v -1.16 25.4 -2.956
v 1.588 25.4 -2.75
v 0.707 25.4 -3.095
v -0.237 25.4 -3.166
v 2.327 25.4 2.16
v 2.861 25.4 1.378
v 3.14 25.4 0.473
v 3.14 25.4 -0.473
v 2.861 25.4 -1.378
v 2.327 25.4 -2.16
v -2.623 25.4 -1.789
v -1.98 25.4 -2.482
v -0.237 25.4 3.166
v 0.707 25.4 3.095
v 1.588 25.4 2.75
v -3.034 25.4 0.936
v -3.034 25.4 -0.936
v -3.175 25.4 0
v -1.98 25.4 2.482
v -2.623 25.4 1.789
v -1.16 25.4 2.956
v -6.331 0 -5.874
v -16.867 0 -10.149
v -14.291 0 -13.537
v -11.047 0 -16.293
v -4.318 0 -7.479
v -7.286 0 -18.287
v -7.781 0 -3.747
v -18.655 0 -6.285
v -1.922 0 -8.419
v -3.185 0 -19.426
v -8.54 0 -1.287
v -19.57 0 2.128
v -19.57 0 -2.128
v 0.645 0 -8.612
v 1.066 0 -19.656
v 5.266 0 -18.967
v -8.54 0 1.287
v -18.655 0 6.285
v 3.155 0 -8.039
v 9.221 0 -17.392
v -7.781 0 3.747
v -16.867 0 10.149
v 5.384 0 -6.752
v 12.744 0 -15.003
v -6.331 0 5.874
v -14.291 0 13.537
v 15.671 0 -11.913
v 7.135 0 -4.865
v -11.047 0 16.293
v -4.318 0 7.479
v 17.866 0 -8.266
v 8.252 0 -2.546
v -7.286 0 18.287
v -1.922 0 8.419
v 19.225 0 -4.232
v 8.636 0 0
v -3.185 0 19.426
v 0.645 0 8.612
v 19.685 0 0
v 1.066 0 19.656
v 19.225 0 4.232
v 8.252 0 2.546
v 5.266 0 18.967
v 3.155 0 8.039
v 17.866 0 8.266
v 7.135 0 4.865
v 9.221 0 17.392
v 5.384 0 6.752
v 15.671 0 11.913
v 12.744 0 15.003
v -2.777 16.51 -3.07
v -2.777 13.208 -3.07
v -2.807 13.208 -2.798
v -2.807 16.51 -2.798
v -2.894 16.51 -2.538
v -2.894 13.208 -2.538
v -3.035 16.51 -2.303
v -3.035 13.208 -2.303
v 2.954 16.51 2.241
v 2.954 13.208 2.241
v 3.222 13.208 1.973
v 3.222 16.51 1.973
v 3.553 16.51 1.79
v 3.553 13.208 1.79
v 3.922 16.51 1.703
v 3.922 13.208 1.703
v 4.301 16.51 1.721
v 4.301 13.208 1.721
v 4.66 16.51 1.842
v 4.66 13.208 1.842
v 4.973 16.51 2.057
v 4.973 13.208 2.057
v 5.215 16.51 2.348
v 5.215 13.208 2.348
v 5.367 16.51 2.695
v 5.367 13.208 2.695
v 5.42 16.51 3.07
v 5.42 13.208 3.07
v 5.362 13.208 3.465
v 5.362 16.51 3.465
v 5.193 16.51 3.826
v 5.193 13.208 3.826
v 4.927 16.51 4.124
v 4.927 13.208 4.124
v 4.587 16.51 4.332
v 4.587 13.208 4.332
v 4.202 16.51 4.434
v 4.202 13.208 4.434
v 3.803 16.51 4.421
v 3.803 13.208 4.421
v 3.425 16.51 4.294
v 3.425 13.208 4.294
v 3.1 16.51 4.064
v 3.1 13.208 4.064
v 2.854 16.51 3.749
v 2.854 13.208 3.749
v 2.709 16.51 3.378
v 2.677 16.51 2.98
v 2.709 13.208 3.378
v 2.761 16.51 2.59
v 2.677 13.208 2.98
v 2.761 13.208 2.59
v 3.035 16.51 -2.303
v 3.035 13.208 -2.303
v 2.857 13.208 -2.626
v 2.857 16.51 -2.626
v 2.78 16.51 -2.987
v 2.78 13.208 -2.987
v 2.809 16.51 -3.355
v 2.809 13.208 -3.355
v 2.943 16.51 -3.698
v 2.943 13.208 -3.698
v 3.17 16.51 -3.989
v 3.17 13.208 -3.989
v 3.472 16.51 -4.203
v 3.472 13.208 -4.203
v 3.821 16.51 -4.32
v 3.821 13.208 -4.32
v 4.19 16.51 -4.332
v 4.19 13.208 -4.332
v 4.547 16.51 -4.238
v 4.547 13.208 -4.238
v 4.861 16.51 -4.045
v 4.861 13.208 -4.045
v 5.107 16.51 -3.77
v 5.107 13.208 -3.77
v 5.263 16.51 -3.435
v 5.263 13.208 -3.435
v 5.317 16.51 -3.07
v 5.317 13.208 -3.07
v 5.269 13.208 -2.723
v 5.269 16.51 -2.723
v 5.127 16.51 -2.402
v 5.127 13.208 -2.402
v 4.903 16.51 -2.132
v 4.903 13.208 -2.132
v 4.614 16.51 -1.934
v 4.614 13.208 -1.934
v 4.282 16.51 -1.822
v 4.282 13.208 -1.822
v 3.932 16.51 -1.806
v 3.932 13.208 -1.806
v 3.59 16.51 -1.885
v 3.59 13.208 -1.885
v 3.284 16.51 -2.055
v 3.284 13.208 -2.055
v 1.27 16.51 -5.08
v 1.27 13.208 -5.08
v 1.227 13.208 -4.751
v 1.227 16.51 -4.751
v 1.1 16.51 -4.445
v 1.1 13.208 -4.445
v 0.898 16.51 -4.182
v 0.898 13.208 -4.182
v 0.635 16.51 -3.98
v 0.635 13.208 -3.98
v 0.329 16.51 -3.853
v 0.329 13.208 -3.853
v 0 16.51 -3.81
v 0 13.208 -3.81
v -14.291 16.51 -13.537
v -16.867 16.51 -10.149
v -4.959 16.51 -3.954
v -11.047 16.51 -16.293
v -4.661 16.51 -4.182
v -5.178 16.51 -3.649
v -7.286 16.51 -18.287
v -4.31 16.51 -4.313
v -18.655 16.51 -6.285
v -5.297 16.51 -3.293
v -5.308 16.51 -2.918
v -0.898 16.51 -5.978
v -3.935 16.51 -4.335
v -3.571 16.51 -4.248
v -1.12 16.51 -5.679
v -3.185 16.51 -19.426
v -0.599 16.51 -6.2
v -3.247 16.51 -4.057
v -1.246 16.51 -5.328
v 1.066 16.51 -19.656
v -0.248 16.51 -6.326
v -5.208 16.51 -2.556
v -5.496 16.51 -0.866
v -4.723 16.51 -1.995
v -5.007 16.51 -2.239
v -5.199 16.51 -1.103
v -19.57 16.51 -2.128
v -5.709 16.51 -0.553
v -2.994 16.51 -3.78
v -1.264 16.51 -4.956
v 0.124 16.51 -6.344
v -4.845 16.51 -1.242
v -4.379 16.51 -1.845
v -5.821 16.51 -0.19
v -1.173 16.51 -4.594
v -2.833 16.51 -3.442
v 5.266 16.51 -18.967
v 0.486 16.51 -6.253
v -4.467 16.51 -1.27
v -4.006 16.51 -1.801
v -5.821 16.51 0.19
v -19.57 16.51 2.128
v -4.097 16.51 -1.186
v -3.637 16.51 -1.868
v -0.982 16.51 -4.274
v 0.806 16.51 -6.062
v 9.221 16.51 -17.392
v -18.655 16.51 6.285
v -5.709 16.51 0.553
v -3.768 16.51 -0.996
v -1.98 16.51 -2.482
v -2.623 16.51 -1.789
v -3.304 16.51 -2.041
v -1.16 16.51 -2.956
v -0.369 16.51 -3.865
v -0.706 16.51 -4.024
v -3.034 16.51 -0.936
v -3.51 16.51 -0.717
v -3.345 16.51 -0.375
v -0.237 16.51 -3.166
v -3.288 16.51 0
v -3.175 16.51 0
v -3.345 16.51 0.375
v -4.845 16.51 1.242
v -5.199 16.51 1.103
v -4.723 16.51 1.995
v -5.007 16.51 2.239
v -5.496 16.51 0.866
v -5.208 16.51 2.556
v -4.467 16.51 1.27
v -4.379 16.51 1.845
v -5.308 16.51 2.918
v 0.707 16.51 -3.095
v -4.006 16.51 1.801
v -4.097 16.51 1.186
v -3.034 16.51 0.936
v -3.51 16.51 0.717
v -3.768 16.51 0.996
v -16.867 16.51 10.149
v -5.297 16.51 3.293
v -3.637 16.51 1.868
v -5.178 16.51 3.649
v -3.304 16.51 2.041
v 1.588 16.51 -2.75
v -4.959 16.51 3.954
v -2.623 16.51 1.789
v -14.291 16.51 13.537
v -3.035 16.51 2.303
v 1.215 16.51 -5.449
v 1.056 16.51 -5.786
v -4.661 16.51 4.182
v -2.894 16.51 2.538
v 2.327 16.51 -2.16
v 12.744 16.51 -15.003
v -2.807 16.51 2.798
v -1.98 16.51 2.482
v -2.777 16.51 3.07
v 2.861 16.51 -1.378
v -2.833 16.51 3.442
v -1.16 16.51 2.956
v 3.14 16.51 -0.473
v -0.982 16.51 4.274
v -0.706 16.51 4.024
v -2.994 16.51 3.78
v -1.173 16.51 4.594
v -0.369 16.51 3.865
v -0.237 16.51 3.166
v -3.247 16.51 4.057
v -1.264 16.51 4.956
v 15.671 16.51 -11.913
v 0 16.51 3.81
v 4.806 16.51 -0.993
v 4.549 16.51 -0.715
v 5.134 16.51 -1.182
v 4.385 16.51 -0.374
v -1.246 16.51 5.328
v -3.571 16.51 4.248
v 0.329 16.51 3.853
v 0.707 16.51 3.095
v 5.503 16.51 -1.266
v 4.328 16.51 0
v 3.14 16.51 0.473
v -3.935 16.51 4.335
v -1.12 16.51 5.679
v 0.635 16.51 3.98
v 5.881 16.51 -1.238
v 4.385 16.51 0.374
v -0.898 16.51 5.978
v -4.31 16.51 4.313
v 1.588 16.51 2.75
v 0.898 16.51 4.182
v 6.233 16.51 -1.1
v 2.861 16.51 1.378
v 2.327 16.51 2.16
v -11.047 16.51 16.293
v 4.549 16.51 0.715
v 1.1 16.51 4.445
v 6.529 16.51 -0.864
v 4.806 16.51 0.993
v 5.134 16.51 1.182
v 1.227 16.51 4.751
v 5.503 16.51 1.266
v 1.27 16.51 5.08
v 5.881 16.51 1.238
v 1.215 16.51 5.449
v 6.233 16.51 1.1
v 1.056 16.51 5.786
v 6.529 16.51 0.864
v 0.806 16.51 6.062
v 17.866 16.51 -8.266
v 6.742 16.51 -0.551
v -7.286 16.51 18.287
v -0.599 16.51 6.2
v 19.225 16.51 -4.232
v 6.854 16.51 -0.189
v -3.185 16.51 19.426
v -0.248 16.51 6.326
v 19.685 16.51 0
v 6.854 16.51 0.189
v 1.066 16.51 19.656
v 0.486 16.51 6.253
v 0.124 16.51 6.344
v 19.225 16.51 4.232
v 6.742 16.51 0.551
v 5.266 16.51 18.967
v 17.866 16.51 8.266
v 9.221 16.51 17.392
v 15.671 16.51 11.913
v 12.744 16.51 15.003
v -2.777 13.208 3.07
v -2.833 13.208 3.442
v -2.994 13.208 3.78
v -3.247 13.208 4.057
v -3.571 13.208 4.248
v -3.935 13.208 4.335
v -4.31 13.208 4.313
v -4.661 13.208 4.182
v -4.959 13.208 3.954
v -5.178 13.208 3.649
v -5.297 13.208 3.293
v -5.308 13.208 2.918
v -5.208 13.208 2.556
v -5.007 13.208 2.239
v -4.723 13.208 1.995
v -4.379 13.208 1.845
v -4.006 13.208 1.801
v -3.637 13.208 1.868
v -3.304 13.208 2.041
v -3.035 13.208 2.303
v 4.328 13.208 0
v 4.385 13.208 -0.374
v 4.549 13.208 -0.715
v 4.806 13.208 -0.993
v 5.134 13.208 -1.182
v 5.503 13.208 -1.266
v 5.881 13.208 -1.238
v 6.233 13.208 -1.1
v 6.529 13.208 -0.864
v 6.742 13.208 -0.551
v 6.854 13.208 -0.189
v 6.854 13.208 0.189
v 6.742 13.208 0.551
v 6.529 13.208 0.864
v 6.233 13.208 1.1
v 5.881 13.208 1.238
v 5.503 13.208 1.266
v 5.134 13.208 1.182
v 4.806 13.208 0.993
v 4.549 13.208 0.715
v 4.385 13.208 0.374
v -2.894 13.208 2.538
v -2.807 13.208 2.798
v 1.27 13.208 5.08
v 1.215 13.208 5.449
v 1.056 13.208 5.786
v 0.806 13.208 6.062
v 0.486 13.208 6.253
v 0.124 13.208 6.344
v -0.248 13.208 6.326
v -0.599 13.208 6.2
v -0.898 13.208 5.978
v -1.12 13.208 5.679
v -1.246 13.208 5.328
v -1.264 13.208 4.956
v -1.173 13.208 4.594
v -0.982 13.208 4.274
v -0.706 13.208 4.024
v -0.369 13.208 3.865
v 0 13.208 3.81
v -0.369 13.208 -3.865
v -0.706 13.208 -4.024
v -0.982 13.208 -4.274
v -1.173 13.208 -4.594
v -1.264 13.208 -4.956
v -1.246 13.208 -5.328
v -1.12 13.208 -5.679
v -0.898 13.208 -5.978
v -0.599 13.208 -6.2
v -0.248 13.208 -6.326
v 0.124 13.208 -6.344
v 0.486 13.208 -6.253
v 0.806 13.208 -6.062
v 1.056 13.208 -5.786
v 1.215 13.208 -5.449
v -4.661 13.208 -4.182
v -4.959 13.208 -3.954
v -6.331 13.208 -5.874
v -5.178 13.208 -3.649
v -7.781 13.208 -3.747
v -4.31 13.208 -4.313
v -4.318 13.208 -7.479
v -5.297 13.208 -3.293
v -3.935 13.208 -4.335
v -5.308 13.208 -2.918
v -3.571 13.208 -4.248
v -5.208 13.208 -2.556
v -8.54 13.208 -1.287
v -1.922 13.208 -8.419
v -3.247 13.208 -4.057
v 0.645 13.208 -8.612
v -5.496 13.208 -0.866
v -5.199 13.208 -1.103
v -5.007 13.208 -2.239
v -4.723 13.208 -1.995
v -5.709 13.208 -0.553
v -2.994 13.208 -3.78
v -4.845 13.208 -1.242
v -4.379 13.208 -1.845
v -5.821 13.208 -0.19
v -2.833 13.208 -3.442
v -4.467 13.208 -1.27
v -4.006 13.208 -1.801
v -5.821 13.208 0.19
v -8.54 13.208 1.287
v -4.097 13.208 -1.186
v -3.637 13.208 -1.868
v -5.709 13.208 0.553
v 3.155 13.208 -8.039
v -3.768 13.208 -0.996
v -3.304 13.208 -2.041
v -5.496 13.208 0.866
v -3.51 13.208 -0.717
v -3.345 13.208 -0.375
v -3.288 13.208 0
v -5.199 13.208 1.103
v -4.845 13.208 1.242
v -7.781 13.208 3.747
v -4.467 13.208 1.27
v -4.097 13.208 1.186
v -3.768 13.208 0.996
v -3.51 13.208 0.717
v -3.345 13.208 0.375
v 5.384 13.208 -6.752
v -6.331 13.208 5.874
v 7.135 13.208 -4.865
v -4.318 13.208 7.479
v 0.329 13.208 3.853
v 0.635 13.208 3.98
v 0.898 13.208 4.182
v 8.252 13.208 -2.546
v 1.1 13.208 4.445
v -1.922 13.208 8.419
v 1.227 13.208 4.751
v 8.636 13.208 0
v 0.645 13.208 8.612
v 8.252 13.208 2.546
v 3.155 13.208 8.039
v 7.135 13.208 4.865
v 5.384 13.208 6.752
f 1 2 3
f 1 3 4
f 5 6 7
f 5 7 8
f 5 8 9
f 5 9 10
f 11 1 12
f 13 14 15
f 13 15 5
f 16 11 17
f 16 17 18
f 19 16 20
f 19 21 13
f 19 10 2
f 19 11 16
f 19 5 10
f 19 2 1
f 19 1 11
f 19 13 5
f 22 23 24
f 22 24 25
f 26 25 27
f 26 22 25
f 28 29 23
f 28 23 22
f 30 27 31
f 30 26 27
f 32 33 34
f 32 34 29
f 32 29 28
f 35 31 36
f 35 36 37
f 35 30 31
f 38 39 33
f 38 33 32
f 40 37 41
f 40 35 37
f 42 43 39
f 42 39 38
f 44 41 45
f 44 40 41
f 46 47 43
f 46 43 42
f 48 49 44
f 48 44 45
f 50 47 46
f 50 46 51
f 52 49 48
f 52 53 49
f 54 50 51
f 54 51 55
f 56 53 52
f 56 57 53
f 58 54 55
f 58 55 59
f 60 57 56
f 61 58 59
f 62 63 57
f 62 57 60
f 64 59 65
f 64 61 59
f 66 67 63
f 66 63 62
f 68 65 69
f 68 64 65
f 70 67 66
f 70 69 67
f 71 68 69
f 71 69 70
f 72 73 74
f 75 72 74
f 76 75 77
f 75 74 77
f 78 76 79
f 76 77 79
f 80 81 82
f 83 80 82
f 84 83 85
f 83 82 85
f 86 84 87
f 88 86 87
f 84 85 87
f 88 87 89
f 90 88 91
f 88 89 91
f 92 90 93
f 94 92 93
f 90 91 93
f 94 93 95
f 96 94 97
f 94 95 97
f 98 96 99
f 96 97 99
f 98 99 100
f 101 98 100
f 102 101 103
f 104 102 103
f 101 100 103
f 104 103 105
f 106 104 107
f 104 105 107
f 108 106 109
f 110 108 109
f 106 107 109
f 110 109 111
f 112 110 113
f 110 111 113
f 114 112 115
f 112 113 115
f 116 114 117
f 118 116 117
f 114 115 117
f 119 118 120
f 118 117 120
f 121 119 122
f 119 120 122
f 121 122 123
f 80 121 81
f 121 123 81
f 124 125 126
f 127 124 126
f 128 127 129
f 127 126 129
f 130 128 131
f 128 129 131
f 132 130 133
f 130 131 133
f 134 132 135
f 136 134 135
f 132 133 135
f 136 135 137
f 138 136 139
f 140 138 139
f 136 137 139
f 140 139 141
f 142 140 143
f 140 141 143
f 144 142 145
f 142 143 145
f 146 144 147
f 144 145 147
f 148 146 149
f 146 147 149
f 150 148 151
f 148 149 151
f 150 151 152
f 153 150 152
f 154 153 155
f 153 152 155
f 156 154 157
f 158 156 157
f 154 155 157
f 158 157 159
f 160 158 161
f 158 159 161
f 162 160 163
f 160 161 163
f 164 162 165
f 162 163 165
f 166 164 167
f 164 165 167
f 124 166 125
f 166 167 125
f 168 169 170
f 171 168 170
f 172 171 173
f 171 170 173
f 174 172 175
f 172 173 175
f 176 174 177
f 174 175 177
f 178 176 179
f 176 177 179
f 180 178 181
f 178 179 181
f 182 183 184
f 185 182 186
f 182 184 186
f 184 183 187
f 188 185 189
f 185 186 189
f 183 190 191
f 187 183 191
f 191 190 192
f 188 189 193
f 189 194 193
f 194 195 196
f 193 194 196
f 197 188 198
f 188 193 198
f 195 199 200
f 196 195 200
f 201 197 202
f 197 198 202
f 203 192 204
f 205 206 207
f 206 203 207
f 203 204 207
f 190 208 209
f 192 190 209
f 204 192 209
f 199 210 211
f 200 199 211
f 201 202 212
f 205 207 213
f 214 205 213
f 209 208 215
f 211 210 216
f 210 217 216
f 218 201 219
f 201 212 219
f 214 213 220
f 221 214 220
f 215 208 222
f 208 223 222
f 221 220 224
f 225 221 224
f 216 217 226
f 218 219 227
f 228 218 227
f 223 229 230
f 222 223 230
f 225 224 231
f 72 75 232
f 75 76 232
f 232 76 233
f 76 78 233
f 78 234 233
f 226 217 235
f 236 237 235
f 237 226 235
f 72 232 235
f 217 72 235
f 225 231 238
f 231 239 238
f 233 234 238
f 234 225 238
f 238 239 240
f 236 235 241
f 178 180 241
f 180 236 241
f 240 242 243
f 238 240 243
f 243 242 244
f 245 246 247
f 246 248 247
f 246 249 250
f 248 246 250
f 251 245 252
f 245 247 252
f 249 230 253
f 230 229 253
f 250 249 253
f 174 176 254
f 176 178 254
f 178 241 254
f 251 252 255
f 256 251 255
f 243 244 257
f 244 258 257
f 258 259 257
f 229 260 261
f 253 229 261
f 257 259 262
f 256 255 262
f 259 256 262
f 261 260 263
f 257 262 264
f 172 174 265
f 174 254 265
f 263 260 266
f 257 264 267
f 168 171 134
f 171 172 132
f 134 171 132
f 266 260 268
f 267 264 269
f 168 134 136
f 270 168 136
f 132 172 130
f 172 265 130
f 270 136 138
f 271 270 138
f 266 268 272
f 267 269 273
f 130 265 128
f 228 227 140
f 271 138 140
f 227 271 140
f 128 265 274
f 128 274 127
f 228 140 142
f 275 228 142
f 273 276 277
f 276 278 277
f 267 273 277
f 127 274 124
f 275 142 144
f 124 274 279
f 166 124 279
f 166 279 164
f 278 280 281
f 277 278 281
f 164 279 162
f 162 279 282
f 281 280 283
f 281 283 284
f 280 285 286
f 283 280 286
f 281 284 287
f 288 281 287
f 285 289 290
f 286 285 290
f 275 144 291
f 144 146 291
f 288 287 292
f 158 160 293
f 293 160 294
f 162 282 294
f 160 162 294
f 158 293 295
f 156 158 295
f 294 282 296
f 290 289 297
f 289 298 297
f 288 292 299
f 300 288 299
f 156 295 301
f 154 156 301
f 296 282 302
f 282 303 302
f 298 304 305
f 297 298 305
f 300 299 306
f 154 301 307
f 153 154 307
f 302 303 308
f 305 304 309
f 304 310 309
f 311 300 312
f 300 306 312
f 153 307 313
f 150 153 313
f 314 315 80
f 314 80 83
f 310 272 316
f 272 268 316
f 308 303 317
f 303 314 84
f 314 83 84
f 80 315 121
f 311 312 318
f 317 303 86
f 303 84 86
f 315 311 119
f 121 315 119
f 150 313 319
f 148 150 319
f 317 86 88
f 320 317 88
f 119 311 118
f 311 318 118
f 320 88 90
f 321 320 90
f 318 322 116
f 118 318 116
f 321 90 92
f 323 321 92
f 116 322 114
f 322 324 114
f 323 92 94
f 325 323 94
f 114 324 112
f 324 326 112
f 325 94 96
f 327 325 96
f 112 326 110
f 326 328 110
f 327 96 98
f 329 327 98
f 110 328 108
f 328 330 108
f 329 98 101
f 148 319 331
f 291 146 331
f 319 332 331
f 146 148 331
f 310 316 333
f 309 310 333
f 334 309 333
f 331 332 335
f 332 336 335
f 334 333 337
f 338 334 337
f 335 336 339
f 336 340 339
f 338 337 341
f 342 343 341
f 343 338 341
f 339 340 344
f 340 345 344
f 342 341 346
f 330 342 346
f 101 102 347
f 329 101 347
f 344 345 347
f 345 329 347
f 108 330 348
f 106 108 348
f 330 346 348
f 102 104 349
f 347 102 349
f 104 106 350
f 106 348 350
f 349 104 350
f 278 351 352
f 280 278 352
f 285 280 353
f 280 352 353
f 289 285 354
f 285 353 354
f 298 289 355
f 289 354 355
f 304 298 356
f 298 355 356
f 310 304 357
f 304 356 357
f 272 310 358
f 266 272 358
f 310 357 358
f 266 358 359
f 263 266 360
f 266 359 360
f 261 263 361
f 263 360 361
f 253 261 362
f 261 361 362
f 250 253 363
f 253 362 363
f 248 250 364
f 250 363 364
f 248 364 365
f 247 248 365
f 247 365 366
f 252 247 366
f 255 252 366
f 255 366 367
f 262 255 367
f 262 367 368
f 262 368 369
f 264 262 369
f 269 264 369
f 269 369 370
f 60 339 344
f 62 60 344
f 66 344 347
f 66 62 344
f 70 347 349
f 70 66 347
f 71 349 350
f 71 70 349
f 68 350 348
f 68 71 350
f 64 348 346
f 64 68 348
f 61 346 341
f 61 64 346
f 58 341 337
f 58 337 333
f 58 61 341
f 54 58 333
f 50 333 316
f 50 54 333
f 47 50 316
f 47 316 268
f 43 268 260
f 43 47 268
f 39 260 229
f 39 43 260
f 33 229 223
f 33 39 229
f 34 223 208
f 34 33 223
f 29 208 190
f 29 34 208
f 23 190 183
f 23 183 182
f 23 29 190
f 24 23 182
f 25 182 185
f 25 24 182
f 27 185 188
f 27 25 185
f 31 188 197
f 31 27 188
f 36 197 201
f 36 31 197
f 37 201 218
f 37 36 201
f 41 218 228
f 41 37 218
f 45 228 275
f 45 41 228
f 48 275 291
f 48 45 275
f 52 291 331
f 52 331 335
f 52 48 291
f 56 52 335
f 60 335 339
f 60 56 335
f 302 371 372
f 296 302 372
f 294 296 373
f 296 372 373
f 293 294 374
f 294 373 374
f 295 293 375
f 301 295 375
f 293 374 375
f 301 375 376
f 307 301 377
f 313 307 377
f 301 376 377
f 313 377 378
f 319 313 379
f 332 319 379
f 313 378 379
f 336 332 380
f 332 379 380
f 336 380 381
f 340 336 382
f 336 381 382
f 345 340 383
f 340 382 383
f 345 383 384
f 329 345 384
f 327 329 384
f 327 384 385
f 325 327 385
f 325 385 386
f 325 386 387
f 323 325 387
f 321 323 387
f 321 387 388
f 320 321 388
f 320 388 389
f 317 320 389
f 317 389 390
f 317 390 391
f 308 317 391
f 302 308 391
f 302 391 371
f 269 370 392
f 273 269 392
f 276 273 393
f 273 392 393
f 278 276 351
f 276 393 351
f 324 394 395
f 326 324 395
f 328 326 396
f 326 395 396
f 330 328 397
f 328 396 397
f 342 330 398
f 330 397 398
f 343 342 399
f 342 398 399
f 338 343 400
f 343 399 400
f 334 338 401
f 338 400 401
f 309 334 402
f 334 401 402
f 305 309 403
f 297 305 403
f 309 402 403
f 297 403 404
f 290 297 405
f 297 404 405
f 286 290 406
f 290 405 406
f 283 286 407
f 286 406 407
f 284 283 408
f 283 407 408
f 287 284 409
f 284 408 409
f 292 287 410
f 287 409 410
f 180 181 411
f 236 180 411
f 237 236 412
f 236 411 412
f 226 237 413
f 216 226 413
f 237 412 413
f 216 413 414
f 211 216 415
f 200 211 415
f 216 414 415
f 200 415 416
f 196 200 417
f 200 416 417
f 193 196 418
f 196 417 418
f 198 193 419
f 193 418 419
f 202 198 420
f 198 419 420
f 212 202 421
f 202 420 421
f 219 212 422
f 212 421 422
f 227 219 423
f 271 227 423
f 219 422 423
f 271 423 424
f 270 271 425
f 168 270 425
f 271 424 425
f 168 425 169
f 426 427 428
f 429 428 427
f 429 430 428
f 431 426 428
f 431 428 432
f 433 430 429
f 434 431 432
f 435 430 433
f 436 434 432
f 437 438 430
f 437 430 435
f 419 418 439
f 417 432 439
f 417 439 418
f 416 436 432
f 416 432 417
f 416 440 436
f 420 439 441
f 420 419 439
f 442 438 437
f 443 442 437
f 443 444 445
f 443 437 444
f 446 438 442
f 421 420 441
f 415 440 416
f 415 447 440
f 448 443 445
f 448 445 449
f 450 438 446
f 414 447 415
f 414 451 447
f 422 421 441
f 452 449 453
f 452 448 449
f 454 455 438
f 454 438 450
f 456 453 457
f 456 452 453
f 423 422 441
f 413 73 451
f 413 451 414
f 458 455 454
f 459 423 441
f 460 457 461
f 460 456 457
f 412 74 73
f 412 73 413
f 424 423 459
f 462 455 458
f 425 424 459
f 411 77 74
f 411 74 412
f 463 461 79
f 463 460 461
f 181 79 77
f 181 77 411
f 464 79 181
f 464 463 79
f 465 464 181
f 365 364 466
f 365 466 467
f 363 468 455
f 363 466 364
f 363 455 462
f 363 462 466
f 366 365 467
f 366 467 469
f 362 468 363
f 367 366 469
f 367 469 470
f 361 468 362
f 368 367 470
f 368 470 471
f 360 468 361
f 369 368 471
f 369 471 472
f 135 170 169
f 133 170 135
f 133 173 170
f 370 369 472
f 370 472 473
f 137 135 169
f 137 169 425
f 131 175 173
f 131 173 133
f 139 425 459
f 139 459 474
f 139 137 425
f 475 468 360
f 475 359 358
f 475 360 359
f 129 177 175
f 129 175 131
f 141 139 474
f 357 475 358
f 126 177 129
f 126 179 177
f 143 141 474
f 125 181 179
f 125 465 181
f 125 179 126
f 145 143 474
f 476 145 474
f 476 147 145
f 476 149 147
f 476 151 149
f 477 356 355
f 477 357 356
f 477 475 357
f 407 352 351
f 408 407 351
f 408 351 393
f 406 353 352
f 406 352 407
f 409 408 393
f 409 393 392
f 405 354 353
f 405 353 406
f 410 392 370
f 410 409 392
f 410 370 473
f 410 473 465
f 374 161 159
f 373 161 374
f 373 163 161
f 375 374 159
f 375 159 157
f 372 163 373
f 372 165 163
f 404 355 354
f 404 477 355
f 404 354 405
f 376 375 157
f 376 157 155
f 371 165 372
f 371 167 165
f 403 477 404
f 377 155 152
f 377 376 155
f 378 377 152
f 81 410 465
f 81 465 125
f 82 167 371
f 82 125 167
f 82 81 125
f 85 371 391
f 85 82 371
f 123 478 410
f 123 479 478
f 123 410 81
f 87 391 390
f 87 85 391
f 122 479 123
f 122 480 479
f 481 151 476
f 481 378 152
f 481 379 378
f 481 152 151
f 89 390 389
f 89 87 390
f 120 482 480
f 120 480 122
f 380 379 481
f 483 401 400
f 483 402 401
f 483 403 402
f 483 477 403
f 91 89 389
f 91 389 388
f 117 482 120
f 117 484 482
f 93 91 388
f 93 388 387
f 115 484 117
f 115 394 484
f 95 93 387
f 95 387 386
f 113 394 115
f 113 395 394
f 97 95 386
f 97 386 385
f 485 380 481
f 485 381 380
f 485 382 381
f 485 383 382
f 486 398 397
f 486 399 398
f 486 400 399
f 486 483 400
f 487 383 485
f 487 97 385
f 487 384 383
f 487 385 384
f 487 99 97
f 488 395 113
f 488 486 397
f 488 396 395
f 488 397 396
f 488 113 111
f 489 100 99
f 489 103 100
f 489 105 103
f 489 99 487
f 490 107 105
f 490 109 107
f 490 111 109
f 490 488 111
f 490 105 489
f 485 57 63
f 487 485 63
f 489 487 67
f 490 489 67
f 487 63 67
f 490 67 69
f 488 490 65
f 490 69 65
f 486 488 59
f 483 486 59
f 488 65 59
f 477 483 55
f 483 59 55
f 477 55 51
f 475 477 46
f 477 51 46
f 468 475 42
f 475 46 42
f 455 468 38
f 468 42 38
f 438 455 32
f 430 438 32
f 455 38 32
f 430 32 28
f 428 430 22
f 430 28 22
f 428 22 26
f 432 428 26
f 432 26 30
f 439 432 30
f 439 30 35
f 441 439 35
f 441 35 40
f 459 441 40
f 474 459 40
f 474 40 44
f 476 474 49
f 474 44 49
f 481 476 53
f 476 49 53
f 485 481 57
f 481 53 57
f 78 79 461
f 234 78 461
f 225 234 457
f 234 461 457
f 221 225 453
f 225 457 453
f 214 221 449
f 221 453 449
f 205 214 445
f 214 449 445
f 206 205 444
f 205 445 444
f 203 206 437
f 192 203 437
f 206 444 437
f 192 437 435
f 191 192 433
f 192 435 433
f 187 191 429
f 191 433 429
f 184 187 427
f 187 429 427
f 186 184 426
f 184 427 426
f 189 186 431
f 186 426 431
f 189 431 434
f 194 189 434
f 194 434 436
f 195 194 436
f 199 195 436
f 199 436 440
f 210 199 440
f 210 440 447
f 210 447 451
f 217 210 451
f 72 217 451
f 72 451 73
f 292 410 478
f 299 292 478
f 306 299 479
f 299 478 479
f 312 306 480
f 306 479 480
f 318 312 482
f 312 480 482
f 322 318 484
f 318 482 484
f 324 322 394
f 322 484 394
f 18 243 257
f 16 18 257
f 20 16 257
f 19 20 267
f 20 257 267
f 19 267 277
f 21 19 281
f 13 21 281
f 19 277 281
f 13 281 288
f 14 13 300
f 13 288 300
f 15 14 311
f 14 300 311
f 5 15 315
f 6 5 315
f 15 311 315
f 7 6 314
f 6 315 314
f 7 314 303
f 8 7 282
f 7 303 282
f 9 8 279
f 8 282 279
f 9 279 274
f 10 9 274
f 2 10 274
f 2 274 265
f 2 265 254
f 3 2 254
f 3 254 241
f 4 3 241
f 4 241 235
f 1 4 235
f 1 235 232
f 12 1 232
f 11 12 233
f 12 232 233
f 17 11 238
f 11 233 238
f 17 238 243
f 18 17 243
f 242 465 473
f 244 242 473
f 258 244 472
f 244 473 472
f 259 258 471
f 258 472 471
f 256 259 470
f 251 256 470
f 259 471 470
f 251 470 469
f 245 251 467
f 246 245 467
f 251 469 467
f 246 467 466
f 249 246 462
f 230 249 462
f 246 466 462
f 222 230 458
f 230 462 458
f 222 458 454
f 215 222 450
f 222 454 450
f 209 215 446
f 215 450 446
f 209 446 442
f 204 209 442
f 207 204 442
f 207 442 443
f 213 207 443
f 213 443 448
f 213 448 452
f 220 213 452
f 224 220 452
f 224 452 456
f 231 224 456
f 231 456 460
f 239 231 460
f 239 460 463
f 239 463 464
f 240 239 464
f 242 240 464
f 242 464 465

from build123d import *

# Parameters (mm, degrees)
F0_R     = 19.685
F1_DEPTH = 16.51
F2_R     = 8.636
F3_DEPTH = 13.208
F4_R     = 3.175
F5_DEPTH = 8.89
F6_R     = 1.273629
F7_DEPTH = 25.4


with BuildPart() as f1:
    # F0 (on Front) → F1 (new body)
    with BuildSketch(Plane.XZ):
        Circle(F0_R)
    extrude(amount=-F1_DEPTH)

    # F2 (on Front) → F3 (cut)
    with BuildSketch(Plane.XZ):
        Circle(F2_R)
    extrude(amount=-F3_DEPTH, mode=Mode.SUBTRACT)

    # F4 (on face) → F5 (join)
    with BuildSketch(Plane(origin=(0, 16.51, 0), x_dir=(-1, 0, 0), z_dir=(0, 1, 0))):
        Circle(F4_R)
    extrude(amount=F5_DEPTH)

    # F6 (on face) → F7 (cut)
    with BuildSketch(Plane.XZ.offset(-13.208)):
        with BuildLine():
            ThreePointArc((5.419761, 3.070403), (3.609433, 4.371419), (2.953539, 2.240753))
            ThreePointArc((2.953539, 2.240753), (4.484769, 1.769387), (5.419761, 3.070403))
        make_face()
        with BuildLine():
            ThreePointArc((6.868104, 0), (5.598104, 1.27), (4.328104, 0))
            ThreePointArc((4.328104, 0), (5.598104, -1.27), (6.868104, 0))
        make_face()
        with BuildLine():
            ThreePointArc((5.317101, -3.070403), (4.452036, -1.866689), (3.035326, -2.302802))
            ThreePointArc((3.035326, -2.302802), (3.642166, -4.274117), (5.317101, -3.070403))
        make_face()
        with BuildLine():
            ThreePointArc((-2.777101, -3.070403), (-2.843387, -2.665467), (-3.035326, -2.302802))
            ThreePointArc((-3.035326, -2.302802), (-5.250815, -3.475338), (-2.777101, -3.070403))
        make_face()
        with BuildLine():
            ThreePointArc((1.27, -5.08), (0.898026, -4.181974), (0, -3.81))
            ThreePointArc((0, -3.81), (-0.898026, -5.978026), (1.27, -5.08))
        make_face()
        with Locations((-4.561896, 0)):
            Circle(F6_R)
        with BuildLine():
            ThreePointArc((-2.777101, 3.070403), (-5.250815, 3.475338), (-3.035326, 2.302802))
            ThreePointArc((-3.035326, 2.302802), (-2.843387, 2.665467), (-2.777101, 3.070403))
        make_face()
        with BuildLine():
            ThreePointArc((1.27, 5.08), (-0.898026, 5.978026), (0, 3.81))
            ThreePointArc((0, 3.81), (0.898026, 4.181974), (1.27, 5.08))
        make_face()
    extrude(amount=-F7_DEPTH, mode=Mode.SUBTRACT)


solid = f1.part
